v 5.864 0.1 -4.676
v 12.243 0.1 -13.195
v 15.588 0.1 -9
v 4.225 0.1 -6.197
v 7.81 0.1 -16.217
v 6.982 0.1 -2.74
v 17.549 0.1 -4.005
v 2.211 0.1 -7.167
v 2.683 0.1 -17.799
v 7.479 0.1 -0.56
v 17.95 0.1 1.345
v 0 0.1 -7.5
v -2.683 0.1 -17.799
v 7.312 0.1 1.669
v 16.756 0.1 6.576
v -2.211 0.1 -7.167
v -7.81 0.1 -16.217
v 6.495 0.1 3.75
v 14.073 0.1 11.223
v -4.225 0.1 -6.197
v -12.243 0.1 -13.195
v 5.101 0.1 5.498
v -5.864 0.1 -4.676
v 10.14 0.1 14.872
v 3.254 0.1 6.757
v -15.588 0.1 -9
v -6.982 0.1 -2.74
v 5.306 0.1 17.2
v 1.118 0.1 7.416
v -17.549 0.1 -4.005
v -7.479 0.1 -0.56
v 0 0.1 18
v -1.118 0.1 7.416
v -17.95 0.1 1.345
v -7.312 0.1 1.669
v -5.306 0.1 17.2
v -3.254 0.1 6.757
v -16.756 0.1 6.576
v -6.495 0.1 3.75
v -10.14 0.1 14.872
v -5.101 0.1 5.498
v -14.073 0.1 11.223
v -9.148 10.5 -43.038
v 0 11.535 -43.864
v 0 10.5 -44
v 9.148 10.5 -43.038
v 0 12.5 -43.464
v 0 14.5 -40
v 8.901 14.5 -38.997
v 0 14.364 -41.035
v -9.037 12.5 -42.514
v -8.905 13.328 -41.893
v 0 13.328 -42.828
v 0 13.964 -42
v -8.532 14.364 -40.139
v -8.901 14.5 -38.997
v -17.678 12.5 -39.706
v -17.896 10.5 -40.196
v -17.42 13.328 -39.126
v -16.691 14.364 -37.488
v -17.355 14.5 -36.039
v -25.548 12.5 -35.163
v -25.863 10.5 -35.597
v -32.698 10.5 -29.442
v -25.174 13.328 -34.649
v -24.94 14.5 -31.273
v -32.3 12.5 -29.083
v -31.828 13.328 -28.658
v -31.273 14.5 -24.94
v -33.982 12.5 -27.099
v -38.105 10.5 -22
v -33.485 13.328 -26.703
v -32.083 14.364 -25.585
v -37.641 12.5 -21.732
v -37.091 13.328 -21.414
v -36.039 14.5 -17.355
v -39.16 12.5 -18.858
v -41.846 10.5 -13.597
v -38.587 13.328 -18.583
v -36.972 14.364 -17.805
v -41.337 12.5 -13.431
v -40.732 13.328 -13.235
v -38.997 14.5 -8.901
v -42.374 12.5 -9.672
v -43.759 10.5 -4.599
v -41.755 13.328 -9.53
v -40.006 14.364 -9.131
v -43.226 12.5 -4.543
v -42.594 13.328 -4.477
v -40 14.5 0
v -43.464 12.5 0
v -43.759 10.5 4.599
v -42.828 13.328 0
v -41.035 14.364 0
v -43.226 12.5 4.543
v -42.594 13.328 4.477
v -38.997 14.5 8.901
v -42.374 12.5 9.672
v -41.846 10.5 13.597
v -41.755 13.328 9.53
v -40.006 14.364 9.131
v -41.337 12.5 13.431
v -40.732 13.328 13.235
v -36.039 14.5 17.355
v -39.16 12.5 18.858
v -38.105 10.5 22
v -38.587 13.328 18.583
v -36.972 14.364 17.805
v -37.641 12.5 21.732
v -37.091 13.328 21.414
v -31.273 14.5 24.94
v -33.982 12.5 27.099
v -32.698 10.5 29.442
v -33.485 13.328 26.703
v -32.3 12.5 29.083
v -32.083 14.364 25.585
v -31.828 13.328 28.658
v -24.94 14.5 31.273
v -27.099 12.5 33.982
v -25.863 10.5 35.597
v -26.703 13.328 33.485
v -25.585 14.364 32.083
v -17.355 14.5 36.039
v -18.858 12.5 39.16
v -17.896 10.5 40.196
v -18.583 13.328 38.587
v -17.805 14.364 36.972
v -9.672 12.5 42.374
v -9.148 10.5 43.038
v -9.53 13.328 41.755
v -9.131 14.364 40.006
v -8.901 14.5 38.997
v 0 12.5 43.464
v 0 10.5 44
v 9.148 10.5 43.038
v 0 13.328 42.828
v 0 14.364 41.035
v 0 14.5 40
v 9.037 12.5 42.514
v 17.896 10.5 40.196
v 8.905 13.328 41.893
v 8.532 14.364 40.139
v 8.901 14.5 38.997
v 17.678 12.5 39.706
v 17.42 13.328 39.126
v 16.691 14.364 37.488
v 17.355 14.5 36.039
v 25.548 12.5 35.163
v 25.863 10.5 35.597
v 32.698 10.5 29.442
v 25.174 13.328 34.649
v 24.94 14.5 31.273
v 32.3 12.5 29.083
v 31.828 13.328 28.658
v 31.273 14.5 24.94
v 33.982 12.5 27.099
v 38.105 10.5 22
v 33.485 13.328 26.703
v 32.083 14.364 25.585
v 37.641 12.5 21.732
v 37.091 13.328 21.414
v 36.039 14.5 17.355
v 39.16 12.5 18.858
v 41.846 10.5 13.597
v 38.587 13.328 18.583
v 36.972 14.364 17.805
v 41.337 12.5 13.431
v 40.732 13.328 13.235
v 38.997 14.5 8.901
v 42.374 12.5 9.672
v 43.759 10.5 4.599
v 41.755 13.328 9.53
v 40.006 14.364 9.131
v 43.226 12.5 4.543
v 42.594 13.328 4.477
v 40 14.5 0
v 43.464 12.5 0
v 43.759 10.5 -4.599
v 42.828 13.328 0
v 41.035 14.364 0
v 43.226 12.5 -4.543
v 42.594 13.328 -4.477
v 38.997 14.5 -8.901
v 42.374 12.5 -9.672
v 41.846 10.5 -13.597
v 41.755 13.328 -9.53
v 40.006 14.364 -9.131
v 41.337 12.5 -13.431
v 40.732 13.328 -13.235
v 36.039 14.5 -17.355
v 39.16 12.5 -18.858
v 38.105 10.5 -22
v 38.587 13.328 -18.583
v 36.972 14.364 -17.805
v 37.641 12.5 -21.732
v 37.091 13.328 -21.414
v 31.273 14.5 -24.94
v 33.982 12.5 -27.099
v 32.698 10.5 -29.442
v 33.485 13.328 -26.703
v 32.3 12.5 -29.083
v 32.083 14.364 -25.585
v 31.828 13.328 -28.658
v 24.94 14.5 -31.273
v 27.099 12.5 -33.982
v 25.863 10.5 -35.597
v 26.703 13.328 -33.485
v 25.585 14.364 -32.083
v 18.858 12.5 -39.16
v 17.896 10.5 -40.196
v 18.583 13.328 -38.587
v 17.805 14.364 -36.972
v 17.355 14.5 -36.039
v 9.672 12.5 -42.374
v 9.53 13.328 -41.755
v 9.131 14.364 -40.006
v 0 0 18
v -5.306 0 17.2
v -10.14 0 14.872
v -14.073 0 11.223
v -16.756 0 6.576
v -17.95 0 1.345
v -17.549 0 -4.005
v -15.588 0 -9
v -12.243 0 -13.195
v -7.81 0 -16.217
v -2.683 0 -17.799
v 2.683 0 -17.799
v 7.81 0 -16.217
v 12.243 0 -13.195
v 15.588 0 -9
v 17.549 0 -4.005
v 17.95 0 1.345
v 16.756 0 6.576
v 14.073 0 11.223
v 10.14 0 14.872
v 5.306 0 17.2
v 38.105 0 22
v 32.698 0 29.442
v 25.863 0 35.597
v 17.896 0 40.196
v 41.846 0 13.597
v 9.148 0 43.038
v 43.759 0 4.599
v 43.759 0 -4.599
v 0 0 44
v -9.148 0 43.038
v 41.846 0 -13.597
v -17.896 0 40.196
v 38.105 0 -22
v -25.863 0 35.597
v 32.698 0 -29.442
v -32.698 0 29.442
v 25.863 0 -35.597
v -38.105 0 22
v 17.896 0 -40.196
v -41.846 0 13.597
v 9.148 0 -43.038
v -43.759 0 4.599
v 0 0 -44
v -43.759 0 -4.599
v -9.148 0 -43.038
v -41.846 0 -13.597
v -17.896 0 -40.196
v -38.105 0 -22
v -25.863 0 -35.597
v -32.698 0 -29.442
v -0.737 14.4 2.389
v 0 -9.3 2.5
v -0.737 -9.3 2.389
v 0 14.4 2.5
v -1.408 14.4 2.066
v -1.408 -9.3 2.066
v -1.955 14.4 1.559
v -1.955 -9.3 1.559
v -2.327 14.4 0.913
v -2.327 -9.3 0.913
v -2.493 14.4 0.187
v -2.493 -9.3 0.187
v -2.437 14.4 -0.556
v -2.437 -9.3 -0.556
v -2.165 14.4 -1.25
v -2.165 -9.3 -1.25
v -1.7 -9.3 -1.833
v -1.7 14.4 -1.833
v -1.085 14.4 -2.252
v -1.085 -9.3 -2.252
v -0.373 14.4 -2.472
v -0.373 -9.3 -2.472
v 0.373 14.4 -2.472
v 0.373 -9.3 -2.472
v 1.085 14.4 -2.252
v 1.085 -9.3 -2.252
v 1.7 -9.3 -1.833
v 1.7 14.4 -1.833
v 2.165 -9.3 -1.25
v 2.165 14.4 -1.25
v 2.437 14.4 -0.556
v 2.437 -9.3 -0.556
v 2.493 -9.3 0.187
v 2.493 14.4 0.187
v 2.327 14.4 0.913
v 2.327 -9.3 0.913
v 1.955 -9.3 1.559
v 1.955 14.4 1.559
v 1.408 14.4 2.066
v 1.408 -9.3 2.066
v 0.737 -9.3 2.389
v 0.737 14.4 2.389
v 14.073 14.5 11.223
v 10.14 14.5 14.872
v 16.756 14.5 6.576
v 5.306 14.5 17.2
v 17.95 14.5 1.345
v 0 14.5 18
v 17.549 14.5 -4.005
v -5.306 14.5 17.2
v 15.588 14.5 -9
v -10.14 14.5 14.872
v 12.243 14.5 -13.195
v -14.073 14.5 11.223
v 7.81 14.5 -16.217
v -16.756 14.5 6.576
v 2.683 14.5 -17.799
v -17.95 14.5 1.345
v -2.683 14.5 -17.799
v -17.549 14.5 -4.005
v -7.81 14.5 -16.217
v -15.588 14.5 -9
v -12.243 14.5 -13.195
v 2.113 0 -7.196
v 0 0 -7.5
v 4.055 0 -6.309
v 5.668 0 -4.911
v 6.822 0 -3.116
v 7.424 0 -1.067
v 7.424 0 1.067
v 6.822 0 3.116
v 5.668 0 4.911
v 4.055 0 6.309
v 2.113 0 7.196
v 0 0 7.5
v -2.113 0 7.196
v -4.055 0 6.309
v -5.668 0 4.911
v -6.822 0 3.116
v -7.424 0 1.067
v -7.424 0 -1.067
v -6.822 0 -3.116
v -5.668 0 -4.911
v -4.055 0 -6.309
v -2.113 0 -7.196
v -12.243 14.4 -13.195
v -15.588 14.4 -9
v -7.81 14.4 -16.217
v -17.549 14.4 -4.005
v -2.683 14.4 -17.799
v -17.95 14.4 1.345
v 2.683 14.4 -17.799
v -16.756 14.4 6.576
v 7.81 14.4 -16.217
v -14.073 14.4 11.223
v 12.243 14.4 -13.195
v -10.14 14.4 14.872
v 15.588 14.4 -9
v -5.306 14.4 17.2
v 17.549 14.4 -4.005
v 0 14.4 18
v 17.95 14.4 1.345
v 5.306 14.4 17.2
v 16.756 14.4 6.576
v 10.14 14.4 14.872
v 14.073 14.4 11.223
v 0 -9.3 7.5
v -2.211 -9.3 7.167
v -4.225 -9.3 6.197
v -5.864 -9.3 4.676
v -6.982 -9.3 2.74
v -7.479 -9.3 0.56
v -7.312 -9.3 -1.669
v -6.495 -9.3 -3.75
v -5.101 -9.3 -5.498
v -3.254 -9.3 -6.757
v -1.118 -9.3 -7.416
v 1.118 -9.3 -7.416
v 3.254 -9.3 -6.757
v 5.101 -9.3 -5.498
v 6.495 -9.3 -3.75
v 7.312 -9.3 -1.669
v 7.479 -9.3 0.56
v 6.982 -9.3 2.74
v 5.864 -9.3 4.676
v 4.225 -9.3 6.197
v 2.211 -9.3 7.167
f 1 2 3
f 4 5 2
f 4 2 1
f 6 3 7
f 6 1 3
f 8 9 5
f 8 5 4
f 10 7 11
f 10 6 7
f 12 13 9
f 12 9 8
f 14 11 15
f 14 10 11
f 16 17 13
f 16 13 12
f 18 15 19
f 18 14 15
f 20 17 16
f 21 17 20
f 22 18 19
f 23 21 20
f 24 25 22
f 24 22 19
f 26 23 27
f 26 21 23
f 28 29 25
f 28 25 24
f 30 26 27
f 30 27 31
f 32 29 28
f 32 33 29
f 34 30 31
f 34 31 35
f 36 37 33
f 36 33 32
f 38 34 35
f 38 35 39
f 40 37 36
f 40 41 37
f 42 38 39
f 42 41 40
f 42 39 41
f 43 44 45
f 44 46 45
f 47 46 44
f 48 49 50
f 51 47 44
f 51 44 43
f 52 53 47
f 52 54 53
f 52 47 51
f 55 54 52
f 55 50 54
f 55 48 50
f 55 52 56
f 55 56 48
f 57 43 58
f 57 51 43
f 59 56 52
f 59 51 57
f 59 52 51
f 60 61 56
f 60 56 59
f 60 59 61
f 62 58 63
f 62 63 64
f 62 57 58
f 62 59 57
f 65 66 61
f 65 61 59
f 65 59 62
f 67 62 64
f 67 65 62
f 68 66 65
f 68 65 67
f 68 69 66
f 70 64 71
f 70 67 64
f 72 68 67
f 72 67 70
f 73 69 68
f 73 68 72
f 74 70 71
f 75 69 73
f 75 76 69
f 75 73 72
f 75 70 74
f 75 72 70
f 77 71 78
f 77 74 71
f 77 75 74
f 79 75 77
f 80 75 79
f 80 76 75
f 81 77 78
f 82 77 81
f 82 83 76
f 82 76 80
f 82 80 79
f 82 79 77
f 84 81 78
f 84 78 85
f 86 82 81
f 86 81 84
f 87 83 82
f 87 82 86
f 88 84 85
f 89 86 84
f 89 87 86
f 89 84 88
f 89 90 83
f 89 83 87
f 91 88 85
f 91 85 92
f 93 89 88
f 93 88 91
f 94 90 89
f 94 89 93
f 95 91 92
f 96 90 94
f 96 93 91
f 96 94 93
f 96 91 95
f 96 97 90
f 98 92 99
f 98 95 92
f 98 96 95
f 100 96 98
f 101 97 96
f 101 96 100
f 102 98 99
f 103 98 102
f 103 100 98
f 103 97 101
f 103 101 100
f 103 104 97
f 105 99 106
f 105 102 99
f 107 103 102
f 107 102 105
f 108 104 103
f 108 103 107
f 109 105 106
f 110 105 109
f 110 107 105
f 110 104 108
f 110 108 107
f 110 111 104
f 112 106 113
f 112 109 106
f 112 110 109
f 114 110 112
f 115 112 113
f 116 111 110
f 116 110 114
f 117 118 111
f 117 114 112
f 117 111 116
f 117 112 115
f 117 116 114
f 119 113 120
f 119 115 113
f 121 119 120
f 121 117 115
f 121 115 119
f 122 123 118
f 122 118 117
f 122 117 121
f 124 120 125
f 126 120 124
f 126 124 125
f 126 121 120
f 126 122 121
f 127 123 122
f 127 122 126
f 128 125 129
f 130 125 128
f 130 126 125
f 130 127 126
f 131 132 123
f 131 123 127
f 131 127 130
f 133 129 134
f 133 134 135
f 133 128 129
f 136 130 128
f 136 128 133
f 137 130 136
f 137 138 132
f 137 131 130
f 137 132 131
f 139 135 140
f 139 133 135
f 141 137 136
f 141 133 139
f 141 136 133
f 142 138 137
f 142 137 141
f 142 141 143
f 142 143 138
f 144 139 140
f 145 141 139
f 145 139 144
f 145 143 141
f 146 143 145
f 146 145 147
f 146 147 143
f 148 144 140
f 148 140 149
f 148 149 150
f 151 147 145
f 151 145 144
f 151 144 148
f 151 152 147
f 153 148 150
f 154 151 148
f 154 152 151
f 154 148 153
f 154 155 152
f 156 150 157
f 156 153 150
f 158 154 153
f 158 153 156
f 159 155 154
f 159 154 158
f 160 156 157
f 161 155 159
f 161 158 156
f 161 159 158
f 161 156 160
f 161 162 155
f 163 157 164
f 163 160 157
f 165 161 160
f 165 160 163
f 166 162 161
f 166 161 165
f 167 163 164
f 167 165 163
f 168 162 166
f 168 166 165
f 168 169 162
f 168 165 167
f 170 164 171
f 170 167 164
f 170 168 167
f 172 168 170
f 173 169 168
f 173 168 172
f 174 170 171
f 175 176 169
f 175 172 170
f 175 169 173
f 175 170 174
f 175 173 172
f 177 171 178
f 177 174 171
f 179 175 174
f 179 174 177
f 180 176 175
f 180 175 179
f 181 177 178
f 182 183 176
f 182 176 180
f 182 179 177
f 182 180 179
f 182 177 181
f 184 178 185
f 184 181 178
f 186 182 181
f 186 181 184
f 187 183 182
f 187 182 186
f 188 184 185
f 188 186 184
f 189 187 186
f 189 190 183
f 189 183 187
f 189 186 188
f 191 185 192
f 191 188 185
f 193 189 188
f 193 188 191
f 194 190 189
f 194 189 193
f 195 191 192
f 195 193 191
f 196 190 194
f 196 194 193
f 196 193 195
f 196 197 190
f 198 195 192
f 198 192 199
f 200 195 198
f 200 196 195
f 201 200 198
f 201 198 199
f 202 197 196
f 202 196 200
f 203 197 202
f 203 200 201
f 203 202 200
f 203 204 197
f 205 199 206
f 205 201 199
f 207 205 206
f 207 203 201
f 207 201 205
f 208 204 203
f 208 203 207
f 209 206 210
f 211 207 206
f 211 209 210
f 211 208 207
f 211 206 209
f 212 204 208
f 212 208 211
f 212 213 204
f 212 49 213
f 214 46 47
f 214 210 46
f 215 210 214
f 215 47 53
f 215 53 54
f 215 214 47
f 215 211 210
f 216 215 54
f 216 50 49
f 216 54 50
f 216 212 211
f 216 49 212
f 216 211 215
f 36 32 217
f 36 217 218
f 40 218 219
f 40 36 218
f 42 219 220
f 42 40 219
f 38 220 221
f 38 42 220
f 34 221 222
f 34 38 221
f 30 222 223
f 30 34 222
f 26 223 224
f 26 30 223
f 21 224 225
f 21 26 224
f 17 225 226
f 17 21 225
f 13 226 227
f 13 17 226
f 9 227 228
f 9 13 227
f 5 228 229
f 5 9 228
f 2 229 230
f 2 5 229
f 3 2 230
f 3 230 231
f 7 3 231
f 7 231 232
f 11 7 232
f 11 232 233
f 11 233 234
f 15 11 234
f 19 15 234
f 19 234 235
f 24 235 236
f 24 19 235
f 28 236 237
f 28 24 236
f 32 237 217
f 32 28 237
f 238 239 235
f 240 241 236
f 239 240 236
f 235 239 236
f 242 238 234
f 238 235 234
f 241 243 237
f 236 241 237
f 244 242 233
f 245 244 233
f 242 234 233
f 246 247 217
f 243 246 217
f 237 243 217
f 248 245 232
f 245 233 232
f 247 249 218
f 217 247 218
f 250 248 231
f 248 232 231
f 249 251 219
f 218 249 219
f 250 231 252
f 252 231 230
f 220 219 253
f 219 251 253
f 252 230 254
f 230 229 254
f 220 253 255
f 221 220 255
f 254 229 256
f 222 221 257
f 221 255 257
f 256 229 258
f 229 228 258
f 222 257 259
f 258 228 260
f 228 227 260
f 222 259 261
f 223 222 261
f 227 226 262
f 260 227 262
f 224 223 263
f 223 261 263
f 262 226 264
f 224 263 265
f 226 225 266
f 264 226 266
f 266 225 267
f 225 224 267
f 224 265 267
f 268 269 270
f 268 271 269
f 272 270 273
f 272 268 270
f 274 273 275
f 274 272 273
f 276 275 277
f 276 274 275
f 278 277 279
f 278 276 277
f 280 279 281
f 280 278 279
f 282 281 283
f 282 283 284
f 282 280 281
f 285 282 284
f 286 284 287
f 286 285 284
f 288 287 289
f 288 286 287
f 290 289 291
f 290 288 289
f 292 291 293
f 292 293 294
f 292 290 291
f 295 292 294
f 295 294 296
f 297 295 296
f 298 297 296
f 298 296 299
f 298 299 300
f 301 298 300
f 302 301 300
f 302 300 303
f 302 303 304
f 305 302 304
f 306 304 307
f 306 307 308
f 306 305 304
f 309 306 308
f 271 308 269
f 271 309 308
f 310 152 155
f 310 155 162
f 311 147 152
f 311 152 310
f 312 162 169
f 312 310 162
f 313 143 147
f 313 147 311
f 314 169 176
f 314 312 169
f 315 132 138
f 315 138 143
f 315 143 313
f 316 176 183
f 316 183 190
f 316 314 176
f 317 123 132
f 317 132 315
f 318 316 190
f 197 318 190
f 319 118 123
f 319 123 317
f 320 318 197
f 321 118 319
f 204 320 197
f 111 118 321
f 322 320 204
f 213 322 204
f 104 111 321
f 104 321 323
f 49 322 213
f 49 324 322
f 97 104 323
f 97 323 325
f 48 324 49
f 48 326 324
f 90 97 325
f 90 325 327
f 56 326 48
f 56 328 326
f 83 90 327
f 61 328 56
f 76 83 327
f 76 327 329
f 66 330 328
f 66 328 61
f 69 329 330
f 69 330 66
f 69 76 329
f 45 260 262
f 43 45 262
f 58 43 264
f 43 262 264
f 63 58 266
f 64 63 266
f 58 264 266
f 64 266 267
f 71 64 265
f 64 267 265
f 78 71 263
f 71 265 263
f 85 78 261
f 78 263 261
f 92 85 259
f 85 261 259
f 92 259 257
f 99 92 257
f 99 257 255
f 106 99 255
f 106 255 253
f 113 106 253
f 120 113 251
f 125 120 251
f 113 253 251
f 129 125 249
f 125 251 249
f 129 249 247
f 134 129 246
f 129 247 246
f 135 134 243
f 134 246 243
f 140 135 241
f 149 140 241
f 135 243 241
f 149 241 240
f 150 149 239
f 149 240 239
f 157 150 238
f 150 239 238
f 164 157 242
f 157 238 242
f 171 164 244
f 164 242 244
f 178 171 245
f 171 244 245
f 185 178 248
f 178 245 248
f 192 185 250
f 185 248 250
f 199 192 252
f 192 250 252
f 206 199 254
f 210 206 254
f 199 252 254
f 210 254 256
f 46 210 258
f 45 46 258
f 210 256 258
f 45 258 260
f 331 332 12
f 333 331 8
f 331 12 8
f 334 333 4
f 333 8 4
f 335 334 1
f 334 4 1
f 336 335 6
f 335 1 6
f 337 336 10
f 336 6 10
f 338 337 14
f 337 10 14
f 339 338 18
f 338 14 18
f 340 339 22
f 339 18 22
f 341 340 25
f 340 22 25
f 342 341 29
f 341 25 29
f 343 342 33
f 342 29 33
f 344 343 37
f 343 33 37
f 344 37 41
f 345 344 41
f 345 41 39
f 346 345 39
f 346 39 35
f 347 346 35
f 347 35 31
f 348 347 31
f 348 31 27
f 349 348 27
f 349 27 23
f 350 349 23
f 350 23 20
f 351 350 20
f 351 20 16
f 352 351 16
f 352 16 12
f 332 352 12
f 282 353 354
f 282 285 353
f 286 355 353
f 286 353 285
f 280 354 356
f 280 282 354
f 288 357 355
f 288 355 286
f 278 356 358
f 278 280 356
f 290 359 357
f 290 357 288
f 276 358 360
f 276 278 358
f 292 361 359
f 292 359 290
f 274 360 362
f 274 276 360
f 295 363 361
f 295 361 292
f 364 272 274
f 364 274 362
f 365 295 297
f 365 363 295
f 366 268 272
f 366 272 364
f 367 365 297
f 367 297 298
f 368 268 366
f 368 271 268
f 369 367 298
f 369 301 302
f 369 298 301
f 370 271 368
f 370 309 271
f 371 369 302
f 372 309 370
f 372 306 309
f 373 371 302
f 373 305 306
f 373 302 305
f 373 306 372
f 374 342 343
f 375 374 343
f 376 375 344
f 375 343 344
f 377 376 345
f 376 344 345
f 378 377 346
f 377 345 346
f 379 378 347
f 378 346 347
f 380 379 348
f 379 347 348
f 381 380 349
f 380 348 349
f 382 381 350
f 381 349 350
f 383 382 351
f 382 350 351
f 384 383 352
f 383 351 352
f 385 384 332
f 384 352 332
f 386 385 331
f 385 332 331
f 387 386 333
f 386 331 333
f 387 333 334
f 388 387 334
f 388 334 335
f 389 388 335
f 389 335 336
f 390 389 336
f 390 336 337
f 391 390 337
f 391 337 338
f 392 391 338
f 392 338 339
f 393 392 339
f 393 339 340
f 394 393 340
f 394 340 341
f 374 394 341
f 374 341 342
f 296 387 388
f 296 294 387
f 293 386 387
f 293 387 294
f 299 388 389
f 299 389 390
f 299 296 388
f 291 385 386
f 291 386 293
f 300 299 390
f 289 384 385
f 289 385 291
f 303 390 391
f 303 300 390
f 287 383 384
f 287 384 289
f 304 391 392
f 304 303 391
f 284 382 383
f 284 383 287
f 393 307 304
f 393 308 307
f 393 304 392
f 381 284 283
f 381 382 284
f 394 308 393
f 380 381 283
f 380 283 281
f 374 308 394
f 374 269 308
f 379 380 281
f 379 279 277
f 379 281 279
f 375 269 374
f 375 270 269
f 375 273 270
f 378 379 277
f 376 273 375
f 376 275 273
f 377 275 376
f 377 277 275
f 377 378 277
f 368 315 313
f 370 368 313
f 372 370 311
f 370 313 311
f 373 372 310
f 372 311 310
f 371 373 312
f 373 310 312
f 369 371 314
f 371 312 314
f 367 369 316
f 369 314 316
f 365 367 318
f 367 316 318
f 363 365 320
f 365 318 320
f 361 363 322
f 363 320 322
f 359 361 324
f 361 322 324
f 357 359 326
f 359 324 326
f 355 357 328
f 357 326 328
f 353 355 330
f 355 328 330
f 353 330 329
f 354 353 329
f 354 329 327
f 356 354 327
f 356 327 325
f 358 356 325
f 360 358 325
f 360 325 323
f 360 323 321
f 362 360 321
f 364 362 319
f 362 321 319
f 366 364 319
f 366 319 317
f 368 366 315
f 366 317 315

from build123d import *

# Parameters (mm, degrees)
SKETCH1_R           = 44
BOSS_EXTRUDE1_DEPTH = 14.5
FILLET1_R           = 4
SKETCH2_R           = 18
CUT_EXTRUDE1_DEPTH  = 0.1
SKETCH3_R           = 2.5
CUT_EXTRUDE2_DEPTH  = 64.869867838
SKETCH4_R           = 7.5
SKETCH4_R_2         = 2.5
BOSS_EXTRUDE2_DEPTH = 9.3
CUT_EXTRUDE3_START  = -0.1
SKETCH4_3_R         = 18
SKETCH4_3_R_2       = 7.5
CUT_EXTRUDE3_DEPTH  = 0.1


with BuildPart() as part:
    # Sketch1 → Boss-Extrude1 (new body)
    with BuildSketch(Plane(origin=(0, 0, 0), x_dir=(1, 0, 0), z_dir=(0, 1, 0))):
        Circle(SKETCH1_R)
    extrude(amount=BOSS_EXTRUDE1_DEPTH)

    # Fillet1
    fillet1_edges = [part.edges().sort_by_distance(p)[0] for p in [
        (-44, 14.5, 0),
    ]]
    fillet(fillet1_edges, radius=FILLET1_R)

    # Sketch2 → Cut-Extrude1 (cut)
    with BuildSketch(Plane(origin=(0, 14.5, 0), x_dir=(1, 0, 0), z_dir=(0, 1, 0))):
        Circle(SKETCH2_R)
    extrude(amount=-CUT_EXTRUDE1_DEPTH, mode=Mode.SUBTRACT)

    # Sketch3 → Cut-Extrude2 (cut, through all)
    with BuildSketch(Plane(origin=(0, 14.4, 0), x_dir=(1, 0, 0), z_dir=(0, 1, 0))):
        Circle(SKETCH3_R)
    extrude(amount=-CUT_EXTRUDE2_DEPTH, mode=Mode.SUBTRACT)

    # Sketch4 → Boss-Extrude2 (add)
    with BuildSketch(Plane.XZ):
        Circle(SKETCH4_R)
        Circle(SKETCH4_R_2, mode=Mode.SUBTRACT)
    extrude(amount=BOSS_EXTRUDE2_DEPTH)

    # Sketch4<3> → Cut-Extrude3 (cut)
    with BuildSketch(Plane.XZ.offset(CUT_EXTRUDE3_START)):
        Circle(SKETCH4_3_R)
        Circle(SKETCH4_3_R_2, mode=Mode.SUBTRACT)
    extrude(amount=CUT_EXTRUDE3_DEPTH, mode=Mode.SUBTRACT)


solid = part.part
